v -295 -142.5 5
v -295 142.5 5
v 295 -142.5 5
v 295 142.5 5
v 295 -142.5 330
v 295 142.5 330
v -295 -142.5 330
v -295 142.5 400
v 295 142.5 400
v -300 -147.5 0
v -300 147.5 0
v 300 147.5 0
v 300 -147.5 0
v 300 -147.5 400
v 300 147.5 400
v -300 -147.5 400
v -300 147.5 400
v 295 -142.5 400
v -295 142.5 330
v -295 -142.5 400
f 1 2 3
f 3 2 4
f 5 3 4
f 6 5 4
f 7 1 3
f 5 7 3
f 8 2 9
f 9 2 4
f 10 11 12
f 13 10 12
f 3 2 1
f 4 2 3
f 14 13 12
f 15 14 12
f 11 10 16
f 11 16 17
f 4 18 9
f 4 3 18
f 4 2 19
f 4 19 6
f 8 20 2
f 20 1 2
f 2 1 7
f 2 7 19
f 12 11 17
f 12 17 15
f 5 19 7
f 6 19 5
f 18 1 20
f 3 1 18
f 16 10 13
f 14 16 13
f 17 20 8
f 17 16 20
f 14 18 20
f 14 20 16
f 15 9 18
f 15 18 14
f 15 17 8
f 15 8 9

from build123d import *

# Parameters (mm, degrees)
F0_W     = 600
F0_H     = 295
F1_DEPTH = 400
F2_T     = -5
F3_W     = 590
F3_H     = 285
F4_DEPTH = 325


with BuildPart() as f1:
    # F0 (on Top) → F1 (new body)
    with BuildSketch(Plane.XY):
        Rectangle(F0_W, F0_H)
    extrude(amount=F1_DEPTH)

    # F2
    f2_openings = [f1.faces().sort_by_distance(p)[0] for p in [
        (0, 0, 400),
    ]]
    offset(amount=F2_T, openings=f2_openings)


with BuildPart() as f4:
    # F3 (on face) → F4 (new body)
    with BuildSketch(Plane.XY.offset(5)):
        Rectangle(F3_W, F3_H)
    extrude(amount=F4_DEPTH)


solid = Compound([f1.part, f4.part])
